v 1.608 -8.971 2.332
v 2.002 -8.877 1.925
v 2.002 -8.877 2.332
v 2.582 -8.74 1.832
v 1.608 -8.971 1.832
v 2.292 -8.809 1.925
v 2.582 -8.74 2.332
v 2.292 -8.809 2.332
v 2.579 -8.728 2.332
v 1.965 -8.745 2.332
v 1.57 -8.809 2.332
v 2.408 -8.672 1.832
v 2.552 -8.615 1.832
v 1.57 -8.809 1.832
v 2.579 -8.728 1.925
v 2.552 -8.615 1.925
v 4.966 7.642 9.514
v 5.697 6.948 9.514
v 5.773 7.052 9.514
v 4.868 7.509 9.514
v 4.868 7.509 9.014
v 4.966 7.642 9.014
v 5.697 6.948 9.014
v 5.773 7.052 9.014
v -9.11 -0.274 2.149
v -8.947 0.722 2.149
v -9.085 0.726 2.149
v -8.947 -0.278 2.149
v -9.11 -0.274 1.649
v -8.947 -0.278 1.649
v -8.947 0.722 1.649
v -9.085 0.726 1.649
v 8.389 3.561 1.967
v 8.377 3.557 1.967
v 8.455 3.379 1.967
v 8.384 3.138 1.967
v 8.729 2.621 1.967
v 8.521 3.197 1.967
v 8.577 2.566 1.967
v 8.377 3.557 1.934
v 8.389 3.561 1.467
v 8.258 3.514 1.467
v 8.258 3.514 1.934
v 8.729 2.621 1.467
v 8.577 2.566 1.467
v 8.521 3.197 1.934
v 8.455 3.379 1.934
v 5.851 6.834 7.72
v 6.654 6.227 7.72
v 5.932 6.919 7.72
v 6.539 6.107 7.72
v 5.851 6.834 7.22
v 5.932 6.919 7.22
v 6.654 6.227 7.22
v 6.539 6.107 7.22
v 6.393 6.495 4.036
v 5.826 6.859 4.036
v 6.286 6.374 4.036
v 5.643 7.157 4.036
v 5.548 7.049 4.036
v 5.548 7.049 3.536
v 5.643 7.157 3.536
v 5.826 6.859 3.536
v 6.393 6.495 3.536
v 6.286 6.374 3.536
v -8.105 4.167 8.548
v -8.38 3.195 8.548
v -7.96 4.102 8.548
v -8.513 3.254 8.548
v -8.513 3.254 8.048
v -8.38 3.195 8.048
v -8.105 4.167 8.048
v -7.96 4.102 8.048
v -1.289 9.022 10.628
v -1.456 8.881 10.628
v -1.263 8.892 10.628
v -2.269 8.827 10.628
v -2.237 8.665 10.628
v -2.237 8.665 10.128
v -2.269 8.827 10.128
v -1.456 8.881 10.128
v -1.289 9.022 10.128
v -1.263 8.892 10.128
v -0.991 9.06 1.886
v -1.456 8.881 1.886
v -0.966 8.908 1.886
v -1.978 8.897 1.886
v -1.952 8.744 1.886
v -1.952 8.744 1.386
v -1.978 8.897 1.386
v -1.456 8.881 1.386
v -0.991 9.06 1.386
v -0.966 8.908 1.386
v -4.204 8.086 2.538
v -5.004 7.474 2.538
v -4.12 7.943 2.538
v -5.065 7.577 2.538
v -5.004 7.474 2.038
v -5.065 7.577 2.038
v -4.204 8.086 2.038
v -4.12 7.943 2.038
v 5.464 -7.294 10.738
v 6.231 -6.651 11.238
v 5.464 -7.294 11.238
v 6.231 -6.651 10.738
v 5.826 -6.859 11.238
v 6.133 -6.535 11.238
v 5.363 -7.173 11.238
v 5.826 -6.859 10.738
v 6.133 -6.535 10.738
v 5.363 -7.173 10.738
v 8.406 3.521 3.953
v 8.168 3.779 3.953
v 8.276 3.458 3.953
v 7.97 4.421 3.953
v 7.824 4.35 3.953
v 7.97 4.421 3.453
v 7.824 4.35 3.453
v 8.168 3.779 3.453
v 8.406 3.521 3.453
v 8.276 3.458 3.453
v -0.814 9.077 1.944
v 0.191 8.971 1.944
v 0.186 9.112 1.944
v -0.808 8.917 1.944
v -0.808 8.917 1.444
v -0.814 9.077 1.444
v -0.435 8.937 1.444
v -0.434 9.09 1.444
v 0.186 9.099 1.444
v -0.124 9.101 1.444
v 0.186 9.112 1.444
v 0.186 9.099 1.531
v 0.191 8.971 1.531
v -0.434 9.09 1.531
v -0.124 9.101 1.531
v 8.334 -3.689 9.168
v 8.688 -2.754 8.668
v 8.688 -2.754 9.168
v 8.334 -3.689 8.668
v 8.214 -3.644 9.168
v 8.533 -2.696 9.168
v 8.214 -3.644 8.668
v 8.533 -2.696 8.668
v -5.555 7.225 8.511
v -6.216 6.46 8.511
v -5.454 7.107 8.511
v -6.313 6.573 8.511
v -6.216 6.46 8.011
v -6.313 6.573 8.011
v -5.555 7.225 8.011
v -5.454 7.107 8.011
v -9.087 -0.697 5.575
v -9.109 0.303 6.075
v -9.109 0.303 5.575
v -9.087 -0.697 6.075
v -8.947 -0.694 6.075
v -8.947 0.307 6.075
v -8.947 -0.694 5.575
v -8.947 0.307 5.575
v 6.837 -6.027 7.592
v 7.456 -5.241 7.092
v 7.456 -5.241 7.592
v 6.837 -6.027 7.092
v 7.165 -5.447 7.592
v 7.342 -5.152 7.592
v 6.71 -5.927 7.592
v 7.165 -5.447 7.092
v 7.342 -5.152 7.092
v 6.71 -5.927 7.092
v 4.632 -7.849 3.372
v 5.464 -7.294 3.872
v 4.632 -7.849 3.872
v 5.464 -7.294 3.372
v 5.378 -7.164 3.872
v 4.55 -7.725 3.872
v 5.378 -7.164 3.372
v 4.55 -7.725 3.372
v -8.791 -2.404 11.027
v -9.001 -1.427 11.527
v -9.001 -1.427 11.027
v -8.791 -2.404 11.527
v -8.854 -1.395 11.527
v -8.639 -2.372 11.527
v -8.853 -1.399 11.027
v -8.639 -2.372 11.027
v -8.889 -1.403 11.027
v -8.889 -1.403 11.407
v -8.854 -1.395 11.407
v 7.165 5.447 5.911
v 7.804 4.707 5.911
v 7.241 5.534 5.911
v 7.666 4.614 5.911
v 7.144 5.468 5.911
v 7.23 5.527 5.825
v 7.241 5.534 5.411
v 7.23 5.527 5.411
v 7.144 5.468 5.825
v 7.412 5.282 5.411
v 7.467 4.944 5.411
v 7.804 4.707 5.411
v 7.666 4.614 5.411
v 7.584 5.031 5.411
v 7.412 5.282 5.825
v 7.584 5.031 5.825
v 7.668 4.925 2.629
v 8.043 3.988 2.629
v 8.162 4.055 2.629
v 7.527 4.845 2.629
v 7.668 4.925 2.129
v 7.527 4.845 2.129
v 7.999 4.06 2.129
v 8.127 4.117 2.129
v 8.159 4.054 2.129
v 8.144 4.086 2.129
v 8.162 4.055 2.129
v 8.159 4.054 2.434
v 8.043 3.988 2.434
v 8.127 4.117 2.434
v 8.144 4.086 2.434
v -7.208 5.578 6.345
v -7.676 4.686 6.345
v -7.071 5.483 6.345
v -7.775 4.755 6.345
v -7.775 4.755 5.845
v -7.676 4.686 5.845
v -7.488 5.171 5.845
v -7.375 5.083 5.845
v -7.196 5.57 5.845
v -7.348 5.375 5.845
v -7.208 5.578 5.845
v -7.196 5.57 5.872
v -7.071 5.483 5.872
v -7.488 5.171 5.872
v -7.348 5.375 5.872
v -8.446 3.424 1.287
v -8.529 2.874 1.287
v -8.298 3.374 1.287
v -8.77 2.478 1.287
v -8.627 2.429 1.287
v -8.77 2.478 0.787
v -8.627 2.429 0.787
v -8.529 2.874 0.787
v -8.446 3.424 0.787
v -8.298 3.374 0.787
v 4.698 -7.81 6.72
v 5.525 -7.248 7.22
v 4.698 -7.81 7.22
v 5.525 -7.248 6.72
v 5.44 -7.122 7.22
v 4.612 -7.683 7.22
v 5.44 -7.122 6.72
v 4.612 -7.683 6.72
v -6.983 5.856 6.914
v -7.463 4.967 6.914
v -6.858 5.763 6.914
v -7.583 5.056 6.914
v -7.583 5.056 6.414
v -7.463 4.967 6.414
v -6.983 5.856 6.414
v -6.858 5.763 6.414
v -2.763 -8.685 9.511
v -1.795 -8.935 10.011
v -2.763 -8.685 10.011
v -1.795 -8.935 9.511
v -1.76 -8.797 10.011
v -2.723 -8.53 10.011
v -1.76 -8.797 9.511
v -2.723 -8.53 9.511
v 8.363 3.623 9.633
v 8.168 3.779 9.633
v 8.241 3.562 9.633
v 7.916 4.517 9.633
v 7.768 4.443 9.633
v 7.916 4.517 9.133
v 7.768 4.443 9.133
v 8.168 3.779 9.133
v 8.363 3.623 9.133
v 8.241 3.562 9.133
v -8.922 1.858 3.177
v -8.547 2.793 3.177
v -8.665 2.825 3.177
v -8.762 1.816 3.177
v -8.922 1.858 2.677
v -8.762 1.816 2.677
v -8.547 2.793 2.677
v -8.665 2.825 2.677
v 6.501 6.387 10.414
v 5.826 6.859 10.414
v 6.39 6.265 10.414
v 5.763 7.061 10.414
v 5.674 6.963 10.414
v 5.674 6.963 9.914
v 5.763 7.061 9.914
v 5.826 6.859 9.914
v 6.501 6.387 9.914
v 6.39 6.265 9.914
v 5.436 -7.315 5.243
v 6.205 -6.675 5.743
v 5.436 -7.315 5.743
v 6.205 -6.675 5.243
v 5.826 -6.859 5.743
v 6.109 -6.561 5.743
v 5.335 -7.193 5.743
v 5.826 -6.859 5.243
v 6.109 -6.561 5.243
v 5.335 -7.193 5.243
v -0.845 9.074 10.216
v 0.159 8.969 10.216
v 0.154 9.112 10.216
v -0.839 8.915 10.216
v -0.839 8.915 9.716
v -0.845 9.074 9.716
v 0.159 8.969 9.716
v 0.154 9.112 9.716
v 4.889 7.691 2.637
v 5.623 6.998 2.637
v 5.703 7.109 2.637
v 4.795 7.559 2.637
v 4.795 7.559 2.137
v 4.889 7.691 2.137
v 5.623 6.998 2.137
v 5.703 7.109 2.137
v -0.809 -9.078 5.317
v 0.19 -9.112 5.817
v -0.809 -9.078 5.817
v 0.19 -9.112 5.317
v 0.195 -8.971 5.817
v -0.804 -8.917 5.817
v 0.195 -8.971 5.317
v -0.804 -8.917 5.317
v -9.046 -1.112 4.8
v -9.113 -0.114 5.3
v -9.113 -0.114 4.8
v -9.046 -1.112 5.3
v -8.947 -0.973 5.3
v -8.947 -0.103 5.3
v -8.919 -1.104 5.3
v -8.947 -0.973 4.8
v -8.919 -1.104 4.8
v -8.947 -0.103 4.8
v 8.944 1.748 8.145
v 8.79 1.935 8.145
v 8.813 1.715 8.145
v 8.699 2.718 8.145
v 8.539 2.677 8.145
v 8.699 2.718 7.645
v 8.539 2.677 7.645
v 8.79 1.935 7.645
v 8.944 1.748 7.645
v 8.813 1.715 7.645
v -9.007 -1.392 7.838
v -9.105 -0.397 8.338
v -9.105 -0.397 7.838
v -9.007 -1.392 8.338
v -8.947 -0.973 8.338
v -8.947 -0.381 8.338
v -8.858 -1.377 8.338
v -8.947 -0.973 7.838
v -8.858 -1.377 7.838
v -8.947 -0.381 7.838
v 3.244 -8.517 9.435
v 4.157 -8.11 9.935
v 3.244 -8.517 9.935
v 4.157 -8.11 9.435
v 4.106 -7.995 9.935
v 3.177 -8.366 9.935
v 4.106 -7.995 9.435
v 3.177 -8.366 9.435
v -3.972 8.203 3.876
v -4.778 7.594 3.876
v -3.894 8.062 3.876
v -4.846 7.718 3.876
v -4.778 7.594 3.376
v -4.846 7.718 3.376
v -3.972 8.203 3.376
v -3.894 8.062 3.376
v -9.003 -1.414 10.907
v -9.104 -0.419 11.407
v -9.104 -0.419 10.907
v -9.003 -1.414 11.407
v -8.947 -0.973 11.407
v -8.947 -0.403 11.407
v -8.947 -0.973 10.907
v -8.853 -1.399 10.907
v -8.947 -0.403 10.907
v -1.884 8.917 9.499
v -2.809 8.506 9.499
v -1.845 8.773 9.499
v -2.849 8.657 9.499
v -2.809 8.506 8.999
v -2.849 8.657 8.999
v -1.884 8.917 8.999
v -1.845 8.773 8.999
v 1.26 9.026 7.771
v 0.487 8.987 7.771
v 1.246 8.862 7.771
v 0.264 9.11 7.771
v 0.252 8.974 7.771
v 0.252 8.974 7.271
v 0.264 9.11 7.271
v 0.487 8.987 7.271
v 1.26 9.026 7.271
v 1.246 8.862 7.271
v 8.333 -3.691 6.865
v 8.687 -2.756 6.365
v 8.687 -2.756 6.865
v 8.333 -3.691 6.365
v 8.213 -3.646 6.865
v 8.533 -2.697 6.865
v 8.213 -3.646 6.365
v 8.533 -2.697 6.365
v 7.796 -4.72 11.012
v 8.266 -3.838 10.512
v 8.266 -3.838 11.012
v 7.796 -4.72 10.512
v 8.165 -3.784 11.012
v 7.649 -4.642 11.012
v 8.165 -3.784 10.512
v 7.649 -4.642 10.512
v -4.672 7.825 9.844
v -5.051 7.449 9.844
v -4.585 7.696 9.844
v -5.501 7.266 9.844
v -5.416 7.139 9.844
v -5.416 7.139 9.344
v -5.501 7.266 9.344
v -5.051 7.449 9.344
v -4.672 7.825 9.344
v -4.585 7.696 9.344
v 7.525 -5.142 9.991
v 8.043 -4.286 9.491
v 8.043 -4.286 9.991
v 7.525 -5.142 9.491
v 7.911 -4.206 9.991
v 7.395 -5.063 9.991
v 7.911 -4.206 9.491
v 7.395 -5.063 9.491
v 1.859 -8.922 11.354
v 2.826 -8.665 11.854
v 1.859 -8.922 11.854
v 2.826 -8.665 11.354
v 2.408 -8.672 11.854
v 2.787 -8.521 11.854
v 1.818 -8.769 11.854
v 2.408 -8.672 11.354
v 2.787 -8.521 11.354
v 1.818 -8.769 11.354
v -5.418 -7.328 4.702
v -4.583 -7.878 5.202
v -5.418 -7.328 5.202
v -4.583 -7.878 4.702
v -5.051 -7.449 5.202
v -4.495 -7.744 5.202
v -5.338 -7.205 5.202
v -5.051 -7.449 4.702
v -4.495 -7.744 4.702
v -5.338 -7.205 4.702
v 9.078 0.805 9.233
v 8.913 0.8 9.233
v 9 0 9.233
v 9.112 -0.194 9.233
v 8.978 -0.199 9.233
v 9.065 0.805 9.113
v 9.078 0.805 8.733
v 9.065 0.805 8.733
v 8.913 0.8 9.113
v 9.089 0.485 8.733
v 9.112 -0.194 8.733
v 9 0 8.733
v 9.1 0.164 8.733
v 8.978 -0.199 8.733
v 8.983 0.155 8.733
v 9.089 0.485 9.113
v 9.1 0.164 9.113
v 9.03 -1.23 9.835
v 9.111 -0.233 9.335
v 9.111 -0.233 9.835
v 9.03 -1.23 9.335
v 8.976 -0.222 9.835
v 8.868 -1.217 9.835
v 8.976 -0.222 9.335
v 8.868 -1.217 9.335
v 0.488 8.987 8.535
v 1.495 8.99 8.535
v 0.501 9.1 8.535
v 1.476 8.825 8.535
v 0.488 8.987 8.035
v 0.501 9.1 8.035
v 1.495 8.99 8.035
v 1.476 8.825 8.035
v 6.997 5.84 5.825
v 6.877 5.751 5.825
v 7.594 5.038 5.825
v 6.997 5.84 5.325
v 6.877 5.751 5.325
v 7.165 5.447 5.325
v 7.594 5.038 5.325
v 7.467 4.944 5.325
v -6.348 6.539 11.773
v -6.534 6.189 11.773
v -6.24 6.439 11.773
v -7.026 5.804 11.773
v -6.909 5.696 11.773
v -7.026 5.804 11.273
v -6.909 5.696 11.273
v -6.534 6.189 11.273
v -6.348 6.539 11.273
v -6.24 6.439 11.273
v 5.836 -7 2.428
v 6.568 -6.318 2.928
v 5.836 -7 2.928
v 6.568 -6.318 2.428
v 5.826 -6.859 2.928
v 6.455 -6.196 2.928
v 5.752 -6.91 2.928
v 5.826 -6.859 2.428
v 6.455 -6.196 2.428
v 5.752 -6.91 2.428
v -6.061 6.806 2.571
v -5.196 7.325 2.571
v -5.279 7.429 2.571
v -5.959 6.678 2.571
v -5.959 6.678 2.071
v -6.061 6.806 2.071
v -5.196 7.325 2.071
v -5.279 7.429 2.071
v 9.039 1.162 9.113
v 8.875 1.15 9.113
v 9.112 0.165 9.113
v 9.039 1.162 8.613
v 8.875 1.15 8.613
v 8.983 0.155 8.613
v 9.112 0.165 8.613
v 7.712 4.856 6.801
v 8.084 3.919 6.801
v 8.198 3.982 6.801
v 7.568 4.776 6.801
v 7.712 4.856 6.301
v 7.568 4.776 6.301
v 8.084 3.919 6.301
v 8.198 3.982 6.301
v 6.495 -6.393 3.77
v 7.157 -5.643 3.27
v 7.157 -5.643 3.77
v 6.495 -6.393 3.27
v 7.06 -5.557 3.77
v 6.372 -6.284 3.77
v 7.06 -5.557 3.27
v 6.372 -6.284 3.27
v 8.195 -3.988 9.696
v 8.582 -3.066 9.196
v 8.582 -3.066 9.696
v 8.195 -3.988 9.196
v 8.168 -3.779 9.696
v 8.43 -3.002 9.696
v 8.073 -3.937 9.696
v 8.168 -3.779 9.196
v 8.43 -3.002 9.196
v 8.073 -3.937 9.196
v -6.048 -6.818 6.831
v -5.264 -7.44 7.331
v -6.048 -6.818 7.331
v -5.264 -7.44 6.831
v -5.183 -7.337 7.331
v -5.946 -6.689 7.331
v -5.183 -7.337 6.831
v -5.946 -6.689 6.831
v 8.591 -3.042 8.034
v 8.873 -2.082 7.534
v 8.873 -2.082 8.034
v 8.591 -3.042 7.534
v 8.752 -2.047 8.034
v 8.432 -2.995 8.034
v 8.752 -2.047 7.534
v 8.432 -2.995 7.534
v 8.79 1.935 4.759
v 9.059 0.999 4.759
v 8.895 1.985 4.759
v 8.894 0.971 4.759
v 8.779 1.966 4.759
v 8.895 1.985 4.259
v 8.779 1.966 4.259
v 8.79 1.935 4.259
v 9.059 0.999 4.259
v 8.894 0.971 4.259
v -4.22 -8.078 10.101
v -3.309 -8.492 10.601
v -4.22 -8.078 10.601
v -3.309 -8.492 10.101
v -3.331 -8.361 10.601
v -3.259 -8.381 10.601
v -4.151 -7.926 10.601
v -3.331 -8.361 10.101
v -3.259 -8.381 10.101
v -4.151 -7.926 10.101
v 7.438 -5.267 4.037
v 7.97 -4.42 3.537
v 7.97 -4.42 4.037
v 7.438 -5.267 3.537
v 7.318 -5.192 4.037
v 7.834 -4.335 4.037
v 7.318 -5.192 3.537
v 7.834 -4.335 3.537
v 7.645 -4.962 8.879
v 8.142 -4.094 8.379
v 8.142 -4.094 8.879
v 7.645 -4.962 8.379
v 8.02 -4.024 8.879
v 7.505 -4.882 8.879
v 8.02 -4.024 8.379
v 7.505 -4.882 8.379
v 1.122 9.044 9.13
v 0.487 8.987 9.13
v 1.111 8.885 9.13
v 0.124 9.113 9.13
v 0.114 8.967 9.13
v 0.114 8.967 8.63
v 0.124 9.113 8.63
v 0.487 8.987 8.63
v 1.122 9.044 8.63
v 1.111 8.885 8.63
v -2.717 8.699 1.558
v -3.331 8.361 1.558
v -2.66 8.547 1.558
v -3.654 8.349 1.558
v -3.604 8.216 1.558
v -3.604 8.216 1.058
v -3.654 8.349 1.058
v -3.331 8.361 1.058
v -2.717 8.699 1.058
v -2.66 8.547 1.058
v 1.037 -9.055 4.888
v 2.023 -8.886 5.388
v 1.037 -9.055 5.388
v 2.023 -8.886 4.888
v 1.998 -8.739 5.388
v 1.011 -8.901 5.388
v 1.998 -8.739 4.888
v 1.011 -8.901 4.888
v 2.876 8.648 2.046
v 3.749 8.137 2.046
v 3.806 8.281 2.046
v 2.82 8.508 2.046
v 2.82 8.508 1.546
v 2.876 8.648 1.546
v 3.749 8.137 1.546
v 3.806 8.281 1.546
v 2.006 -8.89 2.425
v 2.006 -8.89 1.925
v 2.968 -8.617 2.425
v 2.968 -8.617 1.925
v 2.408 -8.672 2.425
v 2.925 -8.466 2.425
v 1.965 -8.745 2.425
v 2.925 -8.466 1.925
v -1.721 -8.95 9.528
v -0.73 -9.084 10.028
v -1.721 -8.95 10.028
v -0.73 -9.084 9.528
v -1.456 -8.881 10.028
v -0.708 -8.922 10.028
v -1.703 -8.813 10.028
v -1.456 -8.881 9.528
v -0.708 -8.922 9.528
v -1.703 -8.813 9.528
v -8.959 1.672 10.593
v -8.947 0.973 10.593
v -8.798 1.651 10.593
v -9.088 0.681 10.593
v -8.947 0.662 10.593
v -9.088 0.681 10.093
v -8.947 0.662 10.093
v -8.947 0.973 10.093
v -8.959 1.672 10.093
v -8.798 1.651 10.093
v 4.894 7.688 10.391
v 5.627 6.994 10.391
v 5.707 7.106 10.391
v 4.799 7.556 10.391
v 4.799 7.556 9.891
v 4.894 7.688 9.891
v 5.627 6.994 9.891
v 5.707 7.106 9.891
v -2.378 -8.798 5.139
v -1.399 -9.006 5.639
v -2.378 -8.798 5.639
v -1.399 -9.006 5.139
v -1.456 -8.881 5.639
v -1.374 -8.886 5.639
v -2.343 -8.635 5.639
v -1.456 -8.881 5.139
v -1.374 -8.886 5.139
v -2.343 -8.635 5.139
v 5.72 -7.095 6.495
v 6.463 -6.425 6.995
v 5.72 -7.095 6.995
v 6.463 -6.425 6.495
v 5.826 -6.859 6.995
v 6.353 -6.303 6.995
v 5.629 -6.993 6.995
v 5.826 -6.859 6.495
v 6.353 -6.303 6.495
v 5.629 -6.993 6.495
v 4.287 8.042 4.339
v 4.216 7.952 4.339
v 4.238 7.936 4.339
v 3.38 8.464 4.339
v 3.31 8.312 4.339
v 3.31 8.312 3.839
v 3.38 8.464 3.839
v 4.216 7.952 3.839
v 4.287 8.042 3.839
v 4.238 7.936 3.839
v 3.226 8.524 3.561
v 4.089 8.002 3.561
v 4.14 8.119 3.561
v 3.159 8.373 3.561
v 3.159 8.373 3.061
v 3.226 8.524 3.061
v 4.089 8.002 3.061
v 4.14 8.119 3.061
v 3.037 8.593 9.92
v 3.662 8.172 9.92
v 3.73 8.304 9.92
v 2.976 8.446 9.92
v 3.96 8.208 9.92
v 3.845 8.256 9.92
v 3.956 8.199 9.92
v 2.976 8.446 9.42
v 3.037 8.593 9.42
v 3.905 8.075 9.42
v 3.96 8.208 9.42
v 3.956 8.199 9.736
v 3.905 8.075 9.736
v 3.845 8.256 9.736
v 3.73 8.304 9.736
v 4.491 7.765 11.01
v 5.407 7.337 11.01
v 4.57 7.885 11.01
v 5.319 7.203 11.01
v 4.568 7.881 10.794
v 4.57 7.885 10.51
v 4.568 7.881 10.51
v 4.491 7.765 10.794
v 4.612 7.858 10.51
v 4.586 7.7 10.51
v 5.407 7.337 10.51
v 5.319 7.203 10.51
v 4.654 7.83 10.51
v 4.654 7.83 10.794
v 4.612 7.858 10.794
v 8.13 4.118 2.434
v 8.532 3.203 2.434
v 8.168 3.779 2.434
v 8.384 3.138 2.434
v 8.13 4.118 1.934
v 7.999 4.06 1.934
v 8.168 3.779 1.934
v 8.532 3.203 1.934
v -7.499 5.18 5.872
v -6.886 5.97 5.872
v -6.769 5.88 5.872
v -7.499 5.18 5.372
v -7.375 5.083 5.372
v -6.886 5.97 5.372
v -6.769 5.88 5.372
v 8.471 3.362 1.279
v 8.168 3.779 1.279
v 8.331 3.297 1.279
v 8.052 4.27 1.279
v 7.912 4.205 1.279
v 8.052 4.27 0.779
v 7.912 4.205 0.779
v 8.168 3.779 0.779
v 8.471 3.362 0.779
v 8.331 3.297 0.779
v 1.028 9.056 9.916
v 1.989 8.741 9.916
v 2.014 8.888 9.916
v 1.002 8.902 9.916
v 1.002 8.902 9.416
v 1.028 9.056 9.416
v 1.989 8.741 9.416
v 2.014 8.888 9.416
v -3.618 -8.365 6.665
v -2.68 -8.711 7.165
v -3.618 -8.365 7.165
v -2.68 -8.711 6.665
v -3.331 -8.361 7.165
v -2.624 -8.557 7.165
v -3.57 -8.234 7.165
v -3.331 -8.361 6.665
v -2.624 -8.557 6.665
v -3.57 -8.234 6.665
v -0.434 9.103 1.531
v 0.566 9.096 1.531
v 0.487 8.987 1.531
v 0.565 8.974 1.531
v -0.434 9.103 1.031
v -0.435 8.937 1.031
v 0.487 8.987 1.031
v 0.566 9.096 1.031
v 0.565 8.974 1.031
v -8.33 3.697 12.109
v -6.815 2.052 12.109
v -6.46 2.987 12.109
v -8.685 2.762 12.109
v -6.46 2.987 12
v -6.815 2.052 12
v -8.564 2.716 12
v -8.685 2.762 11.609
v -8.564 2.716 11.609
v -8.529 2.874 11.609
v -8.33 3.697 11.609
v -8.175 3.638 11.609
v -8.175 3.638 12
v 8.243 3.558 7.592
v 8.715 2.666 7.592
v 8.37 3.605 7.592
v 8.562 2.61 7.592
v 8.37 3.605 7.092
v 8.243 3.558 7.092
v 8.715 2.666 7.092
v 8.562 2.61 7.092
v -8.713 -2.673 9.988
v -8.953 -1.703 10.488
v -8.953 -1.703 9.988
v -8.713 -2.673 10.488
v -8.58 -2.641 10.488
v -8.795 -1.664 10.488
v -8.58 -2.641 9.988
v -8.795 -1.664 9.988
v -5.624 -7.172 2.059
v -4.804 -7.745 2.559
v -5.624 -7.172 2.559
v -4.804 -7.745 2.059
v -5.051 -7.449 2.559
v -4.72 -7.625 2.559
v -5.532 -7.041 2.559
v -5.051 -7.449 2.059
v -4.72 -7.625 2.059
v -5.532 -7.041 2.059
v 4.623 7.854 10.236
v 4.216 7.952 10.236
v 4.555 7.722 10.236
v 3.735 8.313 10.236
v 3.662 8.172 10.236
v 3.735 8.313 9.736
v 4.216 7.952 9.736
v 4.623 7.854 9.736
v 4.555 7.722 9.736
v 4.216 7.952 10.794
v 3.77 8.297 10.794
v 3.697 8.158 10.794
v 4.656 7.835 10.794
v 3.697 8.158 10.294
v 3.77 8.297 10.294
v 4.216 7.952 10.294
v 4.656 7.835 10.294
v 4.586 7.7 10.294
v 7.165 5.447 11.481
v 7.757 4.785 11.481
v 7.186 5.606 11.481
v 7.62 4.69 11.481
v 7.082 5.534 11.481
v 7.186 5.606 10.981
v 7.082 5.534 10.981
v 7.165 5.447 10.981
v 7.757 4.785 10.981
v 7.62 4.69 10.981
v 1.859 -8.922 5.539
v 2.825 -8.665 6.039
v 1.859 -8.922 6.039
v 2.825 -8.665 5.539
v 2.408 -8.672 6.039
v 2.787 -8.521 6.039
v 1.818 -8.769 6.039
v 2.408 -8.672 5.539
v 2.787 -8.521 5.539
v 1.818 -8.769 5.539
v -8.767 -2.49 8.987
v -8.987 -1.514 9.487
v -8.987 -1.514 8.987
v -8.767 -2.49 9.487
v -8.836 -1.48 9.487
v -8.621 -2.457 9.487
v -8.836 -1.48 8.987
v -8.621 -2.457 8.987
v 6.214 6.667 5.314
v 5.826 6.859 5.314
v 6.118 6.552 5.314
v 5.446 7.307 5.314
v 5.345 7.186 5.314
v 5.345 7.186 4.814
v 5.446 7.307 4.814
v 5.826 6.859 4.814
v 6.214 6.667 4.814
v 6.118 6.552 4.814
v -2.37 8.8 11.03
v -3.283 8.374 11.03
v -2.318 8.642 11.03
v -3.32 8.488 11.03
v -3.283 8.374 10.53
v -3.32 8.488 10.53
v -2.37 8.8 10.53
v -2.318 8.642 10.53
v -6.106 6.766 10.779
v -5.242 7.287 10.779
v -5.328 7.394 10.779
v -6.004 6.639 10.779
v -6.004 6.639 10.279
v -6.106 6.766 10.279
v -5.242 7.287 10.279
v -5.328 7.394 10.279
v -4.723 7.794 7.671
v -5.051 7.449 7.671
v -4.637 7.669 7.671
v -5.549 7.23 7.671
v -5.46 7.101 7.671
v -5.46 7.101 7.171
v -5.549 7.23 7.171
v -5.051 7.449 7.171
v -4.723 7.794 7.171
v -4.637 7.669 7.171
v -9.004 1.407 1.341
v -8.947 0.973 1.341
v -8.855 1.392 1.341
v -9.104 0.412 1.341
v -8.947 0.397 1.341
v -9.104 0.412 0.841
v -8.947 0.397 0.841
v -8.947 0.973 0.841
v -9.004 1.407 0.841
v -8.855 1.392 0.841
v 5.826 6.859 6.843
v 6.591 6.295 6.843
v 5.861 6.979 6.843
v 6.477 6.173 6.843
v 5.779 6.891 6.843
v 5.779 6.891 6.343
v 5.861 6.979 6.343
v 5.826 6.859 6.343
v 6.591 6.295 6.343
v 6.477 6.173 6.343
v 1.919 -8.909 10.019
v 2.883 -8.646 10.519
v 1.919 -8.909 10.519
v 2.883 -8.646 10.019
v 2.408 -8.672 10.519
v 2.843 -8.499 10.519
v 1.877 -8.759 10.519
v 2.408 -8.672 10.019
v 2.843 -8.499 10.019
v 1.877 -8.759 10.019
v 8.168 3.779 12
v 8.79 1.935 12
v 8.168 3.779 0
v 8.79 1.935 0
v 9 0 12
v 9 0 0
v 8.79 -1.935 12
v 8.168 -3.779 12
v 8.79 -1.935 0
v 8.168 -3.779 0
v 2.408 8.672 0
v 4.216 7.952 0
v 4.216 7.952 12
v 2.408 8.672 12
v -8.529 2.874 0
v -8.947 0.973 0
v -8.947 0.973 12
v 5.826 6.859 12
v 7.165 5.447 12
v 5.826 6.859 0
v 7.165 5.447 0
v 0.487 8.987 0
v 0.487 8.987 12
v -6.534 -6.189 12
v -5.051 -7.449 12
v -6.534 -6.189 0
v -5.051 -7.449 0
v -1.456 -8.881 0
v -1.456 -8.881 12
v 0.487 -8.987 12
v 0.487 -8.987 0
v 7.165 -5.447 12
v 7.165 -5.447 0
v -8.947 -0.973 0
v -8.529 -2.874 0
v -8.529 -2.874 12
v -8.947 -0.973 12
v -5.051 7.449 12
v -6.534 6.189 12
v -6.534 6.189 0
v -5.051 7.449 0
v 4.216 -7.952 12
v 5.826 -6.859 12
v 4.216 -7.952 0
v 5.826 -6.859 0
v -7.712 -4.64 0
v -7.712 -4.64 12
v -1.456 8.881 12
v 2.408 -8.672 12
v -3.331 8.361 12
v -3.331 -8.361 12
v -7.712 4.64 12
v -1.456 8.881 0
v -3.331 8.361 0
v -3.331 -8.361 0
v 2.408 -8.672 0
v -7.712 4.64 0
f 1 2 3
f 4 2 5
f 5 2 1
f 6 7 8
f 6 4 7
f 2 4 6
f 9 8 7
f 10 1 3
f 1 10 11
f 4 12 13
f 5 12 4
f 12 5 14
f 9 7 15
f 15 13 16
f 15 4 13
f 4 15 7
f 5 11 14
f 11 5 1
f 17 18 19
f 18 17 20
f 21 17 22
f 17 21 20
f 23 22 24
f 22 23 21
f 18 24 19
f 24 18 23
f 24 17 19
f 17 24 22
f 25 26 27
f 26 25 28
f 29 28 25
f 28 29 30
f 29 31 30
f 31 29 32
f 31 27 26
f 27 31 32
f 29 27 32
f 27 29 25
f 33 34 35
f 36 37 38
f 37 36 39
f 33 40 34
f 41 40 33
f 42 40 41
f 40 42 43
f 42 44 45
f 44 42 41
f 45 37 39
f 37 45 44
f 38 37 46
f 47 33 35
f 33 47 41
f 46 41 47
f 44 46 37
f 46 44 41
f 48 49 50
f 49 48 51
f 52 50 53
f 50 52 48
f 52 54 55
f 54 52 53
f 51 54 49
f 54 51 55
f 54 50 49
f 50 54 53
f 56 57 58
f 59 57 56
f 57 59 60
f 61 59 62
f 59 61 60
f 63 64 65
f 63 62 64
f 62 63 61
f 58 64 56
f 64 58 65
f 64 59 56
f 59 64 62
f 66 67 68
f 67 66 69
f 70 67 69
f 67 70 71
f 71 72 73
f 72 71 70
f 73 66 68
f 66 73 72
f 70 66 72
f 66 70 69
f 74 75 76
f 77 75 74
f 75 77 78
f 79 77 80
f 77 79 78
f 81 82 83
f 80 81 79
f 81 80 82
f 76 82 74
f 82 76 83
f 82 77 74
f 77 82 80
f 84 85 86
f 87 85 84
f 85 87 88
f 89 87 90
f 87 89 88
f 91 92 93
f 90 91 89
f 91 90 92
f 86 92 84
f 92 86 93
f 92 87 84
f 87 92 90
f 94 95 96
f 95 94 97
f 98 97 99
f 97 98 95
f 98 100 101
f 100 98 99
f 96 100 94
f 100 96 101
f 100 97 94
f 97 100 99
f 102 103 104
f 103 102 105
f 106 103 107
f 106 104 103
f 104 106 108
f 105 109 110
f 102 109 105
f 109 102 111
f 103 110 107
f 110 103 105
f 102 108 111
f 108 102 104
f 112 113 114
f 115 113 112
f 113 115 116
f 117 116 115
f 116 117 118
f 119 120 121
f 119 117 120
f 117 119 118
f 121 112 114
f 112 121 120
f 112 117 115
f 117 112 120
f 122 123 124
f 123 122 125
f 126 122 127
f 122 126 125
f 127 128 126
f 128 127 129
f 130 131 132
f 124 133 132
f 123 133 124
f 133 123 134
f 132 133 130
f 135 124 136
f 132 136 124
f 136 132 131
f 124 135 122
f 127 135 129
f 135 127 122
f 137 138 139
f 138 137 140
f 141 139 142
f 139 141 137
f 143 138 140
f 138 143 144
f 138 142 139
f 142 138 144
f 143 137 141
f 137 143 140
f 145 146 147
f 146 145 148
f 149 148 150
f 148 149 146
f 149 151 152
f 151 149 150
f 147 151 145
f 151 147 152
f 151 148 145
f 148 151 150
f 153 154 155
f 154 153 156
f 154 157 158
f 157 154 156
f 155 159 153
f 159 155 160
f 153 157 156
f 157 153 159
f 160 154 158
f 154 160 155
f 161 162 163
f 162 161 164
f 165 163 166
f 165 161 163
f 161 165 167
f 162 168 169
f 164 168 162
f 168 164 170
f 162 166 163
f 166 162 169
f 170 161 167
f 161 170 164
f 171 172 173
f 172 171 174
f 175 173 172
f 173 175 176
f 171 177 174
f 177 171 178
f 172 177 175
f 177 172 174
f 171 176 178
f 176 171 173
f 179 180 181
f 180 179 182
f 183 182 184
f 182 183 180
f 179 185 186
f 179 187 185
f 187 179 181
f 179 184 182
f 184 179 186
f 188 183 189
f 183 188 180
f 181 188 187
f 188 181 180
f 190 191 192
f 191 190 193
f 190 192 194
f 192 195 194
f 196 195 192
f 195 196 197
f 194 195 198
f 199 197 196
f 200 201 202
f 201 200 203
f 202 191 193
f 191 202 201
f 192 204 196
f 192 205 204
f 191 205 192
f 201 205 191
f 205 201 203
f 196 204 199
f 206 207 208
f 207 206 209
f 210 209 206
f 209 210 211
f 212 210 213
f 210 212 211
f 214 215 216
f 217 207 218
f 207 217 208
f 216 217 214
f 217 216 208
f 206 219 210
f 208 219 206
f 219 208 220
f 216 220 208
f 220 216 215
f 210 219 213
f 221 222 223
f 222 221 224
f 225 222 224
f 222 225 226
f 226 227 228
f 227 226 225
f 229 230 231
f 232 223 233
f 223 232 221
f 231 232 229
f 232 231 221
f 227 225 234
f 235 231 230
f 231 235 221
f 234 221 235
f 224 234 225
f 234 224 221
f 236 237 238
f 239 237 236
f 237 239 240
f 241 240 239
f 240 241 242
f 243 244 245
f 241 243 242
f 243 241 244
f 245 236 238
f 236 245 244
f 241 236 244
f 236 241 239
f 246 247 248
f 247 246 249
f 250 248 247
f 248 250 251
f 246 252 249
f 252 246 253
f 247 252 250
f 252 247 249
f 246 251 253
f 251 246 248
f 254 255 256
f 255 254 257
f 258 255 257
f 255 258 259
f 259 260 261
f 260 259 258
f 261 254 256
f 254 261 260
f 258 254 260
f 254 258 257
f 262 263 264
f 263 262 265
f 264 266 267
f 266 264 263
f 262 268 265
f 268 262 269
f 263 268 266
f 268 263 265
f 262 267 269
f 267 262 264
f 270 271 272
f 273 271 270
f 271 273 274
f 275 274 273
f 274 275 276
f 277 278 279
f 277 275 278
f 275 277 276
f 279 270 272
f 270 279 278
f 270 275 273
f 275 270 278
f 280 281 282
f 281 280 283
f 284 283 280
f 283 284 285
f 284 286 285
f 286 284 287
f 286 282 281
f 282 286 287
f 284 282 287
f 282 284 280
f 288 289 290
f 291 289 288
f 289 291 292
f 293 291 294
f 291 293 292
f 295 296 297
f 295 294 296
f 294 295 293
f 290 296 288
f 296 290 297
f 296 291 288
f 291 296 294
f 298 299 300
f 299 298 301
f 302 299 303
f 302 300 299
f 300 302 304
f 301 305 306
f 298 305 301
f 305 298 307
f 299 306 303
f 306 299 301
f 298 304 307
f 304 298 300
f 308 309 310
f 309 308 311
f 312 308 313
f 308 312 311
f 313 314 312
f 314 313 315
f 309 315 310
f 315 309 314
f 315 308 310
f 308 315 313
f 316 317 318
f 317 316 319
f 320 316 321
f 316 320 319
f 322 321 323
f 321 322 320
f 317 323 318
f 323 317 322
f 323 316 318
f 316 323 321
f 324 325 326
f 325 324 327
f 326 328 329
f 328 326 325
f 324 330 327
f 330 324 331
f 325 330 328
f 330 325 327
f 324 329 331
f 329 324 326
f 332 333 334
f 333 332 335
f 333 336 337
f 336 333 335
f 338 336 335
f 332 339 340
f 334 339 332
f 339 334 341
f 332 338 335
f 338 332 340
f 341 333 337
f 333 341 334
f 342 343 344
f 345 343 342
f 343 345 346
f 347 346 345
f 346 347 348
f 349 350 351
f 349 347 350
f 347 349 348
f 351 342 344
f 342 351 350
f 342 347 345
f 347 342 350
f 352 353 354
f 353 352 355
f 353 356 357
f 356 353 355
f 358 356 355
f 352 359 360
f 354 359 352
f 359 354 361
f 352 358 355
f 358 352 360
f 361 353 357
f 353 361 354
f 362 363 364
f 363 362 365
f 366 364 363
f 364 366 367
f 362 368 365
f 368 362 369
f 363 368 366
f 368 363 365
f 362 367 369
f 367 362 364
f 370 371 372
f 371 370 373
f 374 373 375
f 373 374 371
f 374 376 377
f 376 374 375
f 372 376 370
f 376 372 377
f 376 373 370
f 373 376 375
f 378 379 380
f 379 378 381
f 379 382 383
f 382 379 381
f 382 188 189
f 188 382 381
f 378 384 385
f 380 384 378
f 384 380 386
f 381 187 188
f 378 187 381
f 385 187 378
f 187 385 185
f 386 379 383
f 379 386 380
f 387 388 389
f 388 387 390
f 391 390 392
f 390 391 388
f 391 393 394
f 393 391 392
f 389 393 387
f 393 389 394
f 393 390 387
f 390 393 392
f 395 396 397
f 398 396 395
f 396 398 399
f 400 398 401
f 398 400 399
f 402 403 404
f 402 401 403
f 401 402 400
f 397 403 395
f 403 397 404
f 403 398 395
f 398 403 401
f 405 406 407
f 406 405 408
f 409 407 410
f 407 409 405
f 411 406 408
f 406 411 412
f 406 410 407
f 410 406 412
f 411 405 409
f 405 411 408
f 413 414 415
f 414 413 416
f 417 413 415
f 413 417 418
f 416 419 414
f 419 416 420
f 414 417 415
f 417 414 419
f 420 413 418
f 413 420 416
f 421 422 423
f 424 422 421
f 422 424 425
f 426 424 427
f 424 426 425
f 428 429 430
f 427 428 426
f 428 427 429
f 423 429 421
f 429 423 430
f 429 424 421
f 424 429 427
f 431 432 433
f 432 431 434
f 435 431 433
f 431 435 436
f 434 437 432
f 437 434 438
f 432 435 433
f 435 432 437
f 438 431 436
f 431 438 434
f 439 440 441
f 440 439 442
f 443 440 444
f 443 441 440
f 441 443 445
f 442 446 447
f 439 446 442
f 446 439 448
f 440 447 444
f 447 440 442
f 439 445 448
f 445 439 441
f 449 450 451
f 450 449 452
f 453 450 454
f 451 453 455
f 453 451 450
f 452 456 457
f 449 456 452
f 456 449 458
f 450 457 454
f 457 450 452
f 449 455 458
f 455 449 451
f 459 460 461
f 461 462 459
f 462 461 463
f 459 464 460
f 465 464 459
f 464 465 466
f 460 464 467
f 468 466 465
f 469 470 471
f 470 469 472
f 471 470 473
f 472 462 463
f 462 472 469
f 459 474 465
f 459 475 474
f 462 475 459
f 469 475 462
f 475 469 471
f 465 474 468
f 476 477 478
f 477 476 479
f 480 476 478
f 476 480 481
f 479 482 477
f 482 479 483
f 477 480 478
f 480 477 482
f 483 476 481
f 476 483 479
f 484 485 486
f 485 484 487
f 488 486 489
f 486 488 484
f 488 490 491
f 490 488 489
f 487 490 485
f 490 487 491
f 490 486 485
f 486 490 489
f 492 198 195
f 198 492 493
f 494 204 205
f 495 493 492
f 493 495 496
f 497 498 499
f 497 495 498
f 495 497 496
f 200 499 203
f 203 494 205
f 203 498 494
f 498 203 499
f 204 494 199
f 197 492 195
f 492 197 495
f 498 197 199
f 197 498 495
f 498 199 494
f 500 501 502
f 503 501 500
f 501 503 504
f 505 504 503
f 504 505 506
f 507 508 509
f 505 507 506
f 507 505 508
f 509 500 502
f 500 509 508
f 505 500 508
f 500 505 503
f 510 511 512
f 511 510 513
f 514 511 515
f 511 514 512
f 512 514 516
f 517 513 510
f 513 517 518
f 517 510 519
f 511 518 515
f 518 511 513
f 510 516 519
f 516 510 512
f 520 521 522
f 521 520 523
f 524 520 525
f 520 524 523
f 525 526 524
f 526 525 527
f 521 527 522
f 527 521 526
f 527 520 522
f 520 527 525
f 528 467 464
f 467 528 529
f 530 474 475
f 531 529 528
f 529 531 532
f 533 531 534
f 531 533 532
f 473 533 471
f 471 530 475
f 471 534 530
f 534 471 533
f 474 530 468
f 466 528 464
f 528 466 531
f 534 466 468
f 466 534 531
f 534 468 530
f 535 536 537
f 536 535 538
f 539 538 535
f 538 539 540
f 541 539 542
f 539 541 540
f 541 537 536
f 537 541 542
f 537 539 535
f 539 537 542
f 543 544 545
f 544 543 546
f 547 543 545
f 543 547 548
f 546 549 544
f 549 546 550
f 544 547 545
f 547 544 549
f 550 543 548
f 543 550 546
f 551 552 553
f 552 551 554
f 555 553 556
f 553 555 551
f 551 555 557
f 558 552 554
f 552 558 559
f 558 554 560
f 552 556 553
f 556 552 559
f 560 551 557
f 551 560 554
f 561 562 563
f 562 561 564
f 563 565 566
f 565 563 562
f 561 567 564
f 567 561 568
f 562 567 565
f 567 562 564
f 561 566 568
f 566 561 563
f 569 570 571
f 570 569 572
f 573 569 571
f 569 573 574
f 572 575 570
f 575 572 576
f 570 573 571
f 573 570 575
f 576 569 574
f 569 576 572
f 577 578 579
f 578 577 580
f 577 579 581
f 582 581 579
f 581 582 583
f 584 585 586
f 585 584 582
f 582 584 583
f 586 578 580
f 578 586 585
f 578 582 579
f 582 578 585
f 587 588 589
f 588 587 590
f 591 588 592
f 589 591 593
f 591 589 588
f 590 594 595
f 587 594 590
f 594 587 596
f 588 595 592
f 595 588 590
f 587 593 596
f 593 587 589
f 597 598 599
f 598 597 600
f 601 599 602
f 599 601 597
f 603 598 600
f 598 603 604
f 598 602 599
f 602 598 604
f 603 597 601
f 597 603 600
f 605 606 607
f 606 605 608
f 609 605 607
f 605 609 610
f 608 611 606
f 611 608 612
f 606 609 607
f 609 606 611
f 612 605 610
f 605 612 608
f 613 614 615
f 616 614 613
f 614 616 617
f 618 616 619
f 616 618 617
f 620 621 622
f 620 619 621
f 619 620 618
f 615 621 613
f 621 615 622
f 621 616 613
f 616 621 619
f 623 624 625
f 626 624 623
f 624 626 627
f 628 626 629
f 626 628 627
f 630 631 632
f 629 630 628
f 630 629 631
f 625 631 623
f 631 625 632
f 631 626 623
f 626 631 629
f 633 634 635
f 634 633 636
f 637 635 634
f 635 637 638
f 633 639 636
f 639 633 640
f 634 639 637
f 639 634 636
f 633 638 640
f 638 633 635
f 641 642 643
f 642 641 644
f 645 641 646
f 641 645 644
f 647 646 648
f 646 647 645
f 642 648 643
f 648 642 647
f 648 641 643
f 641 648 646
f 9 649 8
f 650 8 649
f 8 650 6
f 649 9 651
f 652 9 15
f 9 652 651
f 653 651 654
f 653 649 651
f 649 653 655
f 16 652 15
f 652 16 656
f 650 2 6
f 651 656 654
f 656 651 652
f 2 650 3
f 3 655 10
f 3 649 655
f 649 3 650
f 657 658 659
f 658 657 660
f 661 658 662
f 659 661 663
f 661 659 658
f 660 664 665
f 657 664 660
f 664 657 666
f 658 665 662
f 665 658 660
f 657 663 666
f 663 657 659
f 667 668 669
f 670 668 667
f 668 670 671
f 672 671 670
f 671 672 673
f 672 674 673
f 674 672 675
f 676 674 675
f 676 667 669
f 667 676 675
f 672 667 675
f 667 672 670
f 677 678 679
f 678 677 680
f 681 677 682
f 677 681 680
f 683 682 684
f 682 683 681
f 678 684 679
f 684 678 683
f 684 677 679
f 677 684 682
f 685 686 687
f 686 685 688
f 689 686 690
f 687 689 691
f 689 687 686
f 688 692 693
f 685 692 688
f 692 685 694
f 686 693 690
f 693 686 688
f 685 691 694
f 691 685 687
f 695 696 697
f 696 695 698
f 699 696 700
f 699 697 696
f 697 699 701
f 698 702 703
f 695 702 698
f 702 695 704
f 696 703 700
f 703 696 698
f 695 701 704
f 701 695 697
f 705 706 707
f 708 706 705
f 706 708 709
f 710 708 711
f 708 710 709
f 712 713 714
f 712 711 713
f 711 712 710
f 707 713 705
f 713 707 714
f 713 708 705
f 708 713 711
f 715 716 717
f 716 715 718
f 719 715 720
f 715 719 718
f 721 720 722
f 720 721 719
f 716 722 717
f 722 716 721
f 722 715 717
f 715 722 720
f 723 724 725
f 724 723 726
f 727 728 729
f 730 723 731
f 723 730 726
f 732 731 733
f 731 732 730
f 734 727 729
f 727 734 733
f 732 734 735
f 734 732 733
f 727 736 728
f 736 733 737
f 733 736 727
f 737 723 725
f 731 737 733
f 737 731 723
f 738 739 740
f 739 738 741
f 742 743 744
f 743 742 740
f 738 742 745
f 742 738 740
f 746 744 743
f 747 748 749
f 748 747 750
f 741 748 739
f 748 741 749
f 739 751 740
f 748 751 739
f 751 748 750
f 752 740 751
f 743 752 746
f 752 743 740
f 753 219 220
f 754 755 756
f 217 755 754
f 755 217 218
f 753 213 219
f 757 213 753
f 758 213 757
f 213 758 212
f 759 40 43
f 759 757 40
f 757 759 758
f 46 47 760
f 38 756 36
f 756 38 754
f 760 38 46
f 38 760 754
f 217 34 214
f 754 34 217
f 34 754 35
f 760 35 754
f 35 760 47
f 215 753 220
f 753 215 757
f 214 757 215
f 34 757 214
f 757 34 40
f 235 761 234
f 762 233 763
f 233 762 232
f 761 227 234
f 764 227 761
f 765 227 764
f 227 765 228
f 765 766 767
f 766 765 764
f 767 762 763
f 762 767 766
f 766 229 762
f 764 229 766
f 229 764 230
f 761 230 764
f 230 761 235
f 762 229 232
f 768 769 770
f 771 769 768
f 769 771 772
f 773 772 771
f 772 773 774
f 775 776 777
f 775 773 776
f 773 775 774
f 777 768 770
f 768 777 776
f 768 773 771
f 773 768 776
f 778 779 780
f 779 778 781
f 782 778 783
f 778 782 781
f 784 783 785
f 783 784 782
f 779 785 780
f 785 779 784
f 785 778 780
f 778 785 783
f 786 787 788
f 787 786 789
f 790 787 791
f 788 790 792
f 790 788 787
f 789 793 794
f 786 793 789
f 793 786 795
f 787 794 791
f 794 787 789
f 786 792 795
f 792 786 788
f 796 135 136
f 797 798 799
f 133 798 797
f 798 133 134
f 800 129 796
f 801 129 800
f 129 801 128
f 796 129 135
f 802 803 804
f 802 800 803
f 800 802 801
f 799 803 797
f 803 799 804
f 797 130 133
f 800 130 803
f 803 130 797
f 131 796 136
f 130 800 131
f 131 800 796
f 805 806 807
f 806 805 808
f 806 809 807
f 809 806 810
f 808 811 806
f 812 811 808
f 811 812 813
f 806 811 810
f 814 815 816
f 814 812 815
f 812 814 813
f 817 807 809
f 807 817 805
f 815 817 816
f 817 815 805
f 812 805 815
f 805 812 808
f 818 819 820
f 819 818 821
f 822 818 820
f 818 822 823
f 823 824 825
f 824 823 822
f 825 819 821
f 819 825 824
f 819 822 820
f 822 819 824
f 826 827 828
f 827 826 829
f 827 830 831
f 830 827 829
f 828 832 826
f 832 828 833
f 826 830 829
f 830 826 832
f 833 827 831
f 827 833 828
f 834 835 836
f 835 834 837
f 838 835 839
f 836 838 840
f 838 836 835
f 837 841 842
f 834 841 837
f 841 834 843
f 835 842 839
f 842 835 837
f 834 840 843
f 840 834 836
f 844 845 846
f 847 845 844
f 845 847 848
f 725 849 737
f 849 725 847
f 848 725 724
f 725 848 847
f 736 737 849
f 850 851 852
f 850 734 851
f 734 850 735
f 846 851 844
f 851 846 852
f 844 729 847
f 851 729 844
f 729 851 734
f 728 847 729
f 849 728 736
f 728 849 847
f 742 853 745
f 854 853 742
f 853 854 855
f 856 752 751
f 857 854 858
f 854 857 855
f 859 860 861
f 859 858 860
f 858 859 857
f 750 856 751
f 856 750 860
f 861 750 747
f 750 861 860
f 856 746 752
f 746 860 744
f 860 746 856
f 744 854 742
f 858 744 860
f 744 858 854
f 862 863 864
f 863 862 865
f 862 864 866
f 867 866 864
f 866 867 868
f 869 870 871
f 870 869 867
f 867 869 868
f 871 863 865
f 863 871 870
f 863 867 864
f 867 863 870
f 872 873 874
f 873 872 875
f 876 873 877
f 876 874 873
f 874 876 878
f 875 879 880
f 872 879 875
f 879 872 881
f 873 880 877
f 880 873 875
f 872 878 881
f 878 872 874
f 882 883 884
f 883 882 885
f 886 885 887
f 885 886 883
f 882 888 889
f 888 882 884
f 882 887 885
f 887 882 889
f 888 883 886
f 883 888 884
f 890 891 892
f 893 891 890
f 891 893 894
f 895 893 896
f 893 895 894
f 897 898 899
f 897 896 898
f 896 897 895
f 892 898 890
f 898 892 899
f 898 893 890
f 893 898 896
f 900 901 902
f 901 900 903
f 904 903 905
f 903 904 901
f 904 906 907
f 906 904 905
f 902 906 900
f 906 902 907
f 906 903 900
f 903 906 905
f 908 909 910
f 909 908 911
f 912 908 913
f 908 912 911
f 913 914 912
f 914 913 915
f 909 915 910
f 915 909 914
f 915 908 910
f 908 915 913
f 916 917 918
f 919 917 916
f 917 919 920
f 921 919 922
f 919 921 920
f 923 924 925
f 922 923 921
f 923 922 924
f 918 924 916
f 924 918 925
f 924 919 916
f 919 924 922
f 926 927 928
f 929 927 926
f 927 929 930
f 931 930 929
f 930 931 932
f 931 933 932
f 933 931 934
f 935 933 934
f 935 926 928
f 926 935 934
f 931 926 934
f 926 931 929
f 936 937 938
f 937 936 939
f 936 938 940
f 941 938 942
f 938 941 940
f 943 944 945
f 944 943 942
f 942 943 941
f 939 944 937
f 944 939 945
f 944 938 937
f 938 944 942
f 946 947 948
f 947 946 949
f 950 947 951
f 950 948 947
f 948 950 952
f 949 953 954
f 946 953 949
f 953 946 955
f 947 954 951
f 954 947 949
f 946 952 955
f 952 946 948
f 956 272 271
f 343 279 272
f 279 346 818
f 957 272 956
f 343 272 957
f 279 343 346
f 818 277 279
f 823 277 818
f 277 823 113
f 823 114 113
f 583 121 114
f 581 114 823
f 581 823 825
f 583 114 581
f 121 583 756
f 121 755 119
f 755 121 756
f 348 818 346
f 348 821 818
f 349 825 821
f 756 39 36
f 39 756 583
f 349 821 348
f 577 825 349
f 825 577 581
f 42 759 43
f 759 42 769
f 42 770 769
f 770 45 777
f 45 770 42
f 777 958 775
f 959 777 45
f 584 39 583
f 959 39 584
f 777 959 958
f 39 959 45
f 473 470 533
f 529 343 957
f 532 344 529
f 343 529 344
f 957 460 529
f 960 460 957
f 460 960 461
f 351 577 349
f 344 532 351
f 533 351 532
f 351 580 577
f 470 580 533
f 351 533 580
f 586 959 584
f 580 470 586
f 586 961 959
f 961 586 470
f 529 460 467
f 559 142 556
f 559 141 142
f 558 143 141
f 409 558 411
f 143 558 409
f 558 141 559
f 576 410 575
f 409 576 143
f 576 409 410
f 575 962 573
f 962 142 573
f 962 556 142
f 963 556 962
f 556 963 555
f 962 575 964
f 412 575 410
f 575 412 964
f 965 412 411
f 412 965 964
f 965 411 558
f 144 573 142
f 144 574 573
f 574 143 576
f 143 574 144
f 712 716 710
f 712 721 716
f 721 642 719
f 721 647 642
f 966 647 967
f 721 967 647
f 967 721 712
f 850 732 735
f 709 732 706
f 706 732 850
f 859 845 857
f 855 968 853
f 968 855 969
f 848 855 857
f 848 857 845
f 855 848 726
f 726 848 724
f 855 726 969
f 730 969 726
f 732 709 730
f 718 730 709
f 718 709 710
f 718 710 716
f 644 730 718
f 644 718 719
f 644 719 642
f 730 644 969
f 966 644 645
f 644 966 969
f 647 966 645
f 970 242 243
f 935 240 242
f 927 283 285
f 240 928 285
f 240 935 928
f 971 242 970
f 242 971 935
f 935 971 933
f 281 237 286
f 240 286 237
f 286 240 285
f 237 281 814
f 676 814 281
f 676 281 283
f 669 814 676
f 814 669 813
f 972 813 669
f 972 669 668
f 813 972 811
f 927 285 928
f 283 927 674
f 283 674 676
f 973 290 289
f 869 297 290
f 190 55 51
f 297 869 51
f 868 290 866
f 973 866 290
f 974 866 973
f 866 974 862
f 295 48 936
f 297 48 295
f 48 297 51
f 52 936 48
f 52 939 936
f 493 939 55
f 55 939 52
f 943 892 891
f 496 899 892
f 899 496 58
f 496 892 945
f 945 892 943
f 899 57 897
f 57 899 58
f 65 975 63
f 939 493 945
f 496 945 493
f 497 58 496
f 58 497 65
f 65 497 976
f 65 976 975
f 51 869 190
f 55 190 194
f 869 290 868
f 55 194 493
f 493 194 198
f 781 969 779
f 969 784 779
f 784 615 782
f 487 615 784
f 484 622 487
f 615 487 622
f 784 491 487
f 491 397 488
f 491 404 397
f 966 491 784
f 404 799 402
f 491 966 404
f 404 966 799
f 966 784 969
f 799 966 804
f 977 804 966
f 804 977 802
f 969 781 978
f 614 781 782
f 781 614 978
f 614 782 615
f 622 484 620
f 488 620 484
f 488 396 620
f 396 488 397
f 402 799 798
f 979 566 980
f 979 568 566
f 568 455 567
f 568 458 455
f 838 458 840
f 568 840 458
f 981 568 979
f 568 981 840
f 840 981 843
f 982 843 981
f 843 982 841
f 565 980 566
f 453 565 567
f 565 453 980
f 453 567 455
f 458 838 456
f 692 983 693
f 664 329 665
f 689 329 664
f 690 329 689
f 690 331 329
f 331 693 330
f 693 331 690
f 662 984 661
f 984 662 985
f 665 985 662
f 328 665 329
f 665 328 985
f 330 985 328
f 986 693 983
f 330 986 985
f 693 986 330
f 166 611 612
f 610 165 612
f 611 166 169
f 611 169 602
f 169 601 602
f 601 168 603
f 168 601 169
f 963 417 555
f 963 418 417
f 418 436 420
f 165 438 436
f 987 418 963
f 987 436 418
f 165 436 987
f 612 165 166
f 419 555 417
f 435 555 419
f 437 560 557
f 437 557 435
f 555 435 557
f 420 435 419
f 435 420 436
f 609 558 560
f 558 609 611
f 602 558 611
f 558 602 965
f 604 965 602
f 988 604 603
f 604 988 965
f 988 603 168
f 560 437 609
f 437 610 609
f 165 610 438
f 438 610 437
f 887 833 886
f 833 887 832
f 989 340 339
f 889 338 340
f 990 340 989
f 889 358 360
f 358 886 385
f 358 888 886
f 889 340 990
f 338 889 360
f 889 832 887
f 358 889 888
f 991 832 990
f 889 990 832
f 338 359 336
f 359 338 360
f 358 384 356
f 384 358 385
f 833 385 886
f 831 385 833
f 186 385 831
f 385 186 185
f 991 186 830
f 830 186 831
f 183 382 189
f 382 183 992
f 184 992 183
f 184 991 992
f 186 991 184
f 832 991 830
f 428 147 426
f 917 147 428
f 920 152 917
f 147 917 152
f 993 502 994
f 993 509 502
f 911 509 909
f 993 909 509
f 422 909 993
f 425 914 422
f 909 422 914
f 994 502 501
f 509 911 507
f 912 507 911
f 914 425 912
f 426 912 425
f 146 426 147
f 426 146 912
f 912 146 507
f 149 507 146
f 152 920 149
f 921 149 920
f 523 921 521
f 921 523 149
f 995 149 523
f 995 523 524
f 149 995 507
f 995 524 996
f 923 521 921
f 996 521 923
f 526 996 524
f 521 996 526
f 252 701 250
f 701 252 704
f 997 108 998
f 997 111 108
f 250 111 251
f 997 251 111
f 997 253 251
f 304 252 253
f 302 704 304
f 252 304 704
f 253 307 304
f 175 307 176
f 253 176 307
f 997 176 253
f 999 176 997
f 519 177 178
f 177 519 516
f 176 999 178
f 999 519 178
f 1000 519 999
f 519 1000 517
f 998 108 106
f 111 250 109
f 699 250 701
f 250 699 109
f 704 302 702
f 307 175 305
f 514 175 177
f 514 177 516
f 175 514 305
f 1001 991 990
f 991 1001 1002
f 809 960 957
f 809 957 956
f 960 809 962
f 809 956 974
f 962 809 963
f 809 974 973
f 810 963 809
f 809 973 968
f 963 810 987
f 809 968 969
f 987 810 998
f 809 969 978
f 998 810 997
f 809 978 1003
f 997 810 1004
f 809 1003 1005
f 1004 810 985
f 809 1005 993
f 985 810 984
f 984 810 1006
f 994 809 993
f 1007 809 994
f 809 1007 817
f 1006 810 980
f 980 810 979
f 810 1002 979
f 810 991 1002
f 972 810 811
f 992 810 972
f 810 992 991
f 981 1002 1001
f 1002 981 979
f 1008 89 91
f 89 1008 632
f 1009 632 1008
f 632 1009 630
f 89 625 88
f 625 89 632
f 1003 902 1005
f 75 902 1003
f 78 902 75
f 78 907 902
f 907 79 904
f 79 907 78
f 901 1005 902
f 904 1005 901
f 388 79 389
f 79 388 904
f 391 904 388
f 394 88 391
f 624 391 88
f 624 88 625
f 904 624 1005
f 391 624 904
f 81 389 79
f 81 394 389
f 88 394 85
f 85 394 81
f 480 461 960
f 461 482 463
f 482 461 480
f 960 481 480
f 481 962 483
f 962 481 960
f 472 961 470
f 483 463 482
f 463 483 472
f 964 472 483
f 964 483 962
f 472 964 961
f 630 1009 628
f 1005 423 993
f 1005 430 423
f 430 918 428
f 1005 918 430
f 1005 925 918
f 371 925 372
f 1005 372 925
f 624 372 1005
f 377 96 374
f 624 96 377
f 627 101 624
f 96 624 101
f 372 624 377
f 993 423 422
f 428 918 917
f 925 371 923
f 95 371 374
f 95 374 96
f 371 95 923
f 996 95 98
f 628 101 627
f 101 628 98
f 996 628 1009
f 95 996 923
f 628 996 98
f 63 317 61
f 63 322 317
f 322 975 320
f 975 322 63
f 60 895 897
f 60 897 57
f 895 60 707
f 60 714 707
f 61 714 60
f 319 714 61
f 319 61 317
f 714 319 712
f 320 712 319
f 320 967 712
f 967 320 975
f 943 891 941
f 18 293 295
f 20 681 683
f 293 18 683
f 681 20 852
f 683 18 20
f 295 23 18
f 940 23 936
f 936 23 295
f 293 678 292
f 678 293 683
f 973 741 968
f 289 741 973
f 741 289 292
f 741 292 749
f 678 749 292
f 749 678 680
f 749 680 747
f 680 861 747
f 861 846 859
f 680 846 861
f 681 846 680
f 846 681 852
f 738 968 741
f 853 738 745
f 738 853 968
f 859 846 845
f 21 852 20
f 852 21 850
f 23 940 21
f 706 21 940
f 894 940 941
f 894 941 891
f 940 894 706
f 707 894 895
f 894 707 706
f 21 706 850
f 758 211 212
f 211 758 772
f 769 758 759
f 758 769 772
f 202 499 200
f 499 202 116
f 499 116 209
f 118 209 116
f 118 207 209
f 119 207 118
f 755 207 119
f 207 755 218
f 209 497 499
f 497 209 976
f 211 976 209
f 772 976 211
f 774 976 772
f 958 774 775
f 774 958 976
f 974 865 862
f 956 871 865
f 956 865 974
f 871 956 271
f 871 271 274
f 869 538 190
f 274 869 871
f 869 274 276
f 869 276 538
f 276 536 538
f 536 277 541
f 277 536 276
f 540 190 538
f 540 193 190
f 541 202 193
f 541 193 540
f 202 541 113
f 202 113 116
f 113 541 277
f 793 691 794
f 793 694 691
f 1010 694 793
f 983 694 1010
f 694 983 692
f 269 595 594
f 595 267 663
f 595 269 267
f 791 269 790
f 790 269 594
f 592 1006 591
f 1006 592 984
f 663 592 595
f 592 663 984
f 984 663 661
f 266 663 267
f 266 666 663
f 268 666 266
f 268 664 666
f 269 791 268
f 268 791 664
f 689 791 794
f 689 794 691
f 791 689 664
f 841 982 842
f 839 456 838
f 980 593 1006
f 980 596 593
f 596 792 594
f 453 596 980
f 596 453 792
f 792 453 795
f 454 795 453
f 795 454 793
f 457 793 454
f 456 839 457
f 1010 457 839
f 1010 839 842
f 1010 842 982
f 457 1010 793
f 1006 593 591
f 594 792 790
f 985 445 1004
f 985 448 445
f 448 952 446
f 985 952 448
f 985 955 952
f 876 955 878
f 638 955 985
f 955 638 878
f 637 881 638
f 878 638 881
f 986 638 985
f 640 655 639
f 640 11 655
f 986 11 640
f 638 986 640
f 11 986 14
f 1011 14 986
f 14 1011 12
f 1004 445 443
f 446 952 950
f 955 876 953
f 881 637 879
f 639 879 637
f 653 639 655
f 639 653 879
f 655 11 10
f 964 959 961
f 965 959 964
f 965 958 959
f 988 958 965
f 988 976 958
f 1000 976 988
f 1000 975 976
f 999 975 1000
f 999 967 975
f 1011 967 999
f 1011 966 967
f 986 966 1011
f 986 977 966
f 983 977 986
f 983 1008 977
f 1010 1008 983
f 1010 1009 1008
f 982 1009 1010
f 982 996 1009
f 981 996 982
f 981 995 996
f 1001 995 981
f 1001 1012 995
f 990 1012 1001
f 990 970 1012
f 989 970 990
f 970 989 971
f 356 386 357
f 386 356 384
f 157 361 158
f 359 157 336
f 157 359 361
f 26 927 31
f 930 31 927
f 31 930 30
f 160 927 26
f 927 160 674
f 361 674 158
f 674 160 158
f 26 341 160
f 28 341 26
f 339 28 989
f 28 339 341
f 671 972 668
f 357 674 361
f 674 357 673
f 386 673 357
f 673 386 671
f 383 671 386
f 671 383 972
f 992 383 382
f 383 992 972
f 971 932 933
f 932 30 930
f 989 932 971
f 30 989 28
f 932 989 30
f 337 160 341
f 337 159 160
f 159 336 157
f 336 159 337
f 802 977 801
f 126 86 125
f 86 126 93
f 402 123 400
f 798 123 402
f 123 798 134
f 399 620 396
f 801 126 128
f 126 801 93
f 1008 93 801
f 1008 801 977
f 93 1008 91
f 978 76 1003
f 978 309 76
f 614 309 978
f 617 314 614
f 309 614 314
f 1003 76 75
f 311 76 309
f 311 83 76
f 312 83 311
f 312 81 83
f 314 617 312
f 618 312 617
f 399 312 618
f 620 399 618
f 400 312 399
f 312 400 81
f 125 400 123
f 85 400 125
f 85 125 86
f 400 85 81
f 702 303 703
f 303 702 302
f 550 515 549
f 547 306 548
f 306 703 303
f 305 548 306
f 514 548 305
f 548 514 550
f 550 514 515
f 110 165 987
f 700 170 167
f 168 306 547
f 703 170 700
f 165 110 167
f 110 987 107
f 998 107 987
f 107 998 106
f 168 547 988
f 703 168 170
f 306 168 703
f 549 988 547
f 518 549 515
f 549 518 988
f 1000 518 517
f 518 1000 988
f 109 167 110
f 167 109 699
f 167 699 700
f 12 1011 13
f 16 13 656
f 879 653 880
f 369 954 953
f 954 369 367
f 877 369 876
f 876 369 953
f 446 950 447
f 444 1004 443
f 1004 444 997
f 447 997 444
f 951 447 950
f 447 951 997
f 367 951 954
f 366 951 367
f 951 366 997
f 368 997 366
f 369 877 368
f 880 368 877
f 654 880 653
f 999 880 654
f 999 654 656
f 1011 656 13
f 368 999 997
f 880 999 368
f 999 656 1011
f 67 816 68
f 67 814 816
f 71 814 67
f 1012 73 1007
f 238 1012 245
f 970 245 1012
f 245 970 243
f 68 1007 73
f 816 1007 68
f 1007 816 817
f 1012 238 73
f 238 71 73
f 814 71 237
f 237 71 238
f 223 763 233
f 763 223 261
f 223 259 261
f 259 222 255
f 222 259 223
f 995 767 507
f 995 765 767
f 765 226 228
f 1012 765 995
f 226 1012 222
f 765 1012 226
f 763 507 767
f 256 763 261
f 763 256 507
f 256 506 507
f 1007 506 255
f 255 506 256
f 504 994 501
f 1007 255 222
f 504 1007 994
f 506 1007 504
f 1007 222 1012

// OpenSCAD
module brick (height,radius,rands)
{
    for(i=[1:100]) {
        echo(radius,height);
            rotate([0,0,rands(0,360,1)[0]]) 
                    translate([radius-.9,0,rands(1,height,1)[0]]) 
                        cube([2,1,.5],center=true); 
    }
}

radius = 9;
height = 12;

cylinder(height,radius,radius);
brick(height,radius);
